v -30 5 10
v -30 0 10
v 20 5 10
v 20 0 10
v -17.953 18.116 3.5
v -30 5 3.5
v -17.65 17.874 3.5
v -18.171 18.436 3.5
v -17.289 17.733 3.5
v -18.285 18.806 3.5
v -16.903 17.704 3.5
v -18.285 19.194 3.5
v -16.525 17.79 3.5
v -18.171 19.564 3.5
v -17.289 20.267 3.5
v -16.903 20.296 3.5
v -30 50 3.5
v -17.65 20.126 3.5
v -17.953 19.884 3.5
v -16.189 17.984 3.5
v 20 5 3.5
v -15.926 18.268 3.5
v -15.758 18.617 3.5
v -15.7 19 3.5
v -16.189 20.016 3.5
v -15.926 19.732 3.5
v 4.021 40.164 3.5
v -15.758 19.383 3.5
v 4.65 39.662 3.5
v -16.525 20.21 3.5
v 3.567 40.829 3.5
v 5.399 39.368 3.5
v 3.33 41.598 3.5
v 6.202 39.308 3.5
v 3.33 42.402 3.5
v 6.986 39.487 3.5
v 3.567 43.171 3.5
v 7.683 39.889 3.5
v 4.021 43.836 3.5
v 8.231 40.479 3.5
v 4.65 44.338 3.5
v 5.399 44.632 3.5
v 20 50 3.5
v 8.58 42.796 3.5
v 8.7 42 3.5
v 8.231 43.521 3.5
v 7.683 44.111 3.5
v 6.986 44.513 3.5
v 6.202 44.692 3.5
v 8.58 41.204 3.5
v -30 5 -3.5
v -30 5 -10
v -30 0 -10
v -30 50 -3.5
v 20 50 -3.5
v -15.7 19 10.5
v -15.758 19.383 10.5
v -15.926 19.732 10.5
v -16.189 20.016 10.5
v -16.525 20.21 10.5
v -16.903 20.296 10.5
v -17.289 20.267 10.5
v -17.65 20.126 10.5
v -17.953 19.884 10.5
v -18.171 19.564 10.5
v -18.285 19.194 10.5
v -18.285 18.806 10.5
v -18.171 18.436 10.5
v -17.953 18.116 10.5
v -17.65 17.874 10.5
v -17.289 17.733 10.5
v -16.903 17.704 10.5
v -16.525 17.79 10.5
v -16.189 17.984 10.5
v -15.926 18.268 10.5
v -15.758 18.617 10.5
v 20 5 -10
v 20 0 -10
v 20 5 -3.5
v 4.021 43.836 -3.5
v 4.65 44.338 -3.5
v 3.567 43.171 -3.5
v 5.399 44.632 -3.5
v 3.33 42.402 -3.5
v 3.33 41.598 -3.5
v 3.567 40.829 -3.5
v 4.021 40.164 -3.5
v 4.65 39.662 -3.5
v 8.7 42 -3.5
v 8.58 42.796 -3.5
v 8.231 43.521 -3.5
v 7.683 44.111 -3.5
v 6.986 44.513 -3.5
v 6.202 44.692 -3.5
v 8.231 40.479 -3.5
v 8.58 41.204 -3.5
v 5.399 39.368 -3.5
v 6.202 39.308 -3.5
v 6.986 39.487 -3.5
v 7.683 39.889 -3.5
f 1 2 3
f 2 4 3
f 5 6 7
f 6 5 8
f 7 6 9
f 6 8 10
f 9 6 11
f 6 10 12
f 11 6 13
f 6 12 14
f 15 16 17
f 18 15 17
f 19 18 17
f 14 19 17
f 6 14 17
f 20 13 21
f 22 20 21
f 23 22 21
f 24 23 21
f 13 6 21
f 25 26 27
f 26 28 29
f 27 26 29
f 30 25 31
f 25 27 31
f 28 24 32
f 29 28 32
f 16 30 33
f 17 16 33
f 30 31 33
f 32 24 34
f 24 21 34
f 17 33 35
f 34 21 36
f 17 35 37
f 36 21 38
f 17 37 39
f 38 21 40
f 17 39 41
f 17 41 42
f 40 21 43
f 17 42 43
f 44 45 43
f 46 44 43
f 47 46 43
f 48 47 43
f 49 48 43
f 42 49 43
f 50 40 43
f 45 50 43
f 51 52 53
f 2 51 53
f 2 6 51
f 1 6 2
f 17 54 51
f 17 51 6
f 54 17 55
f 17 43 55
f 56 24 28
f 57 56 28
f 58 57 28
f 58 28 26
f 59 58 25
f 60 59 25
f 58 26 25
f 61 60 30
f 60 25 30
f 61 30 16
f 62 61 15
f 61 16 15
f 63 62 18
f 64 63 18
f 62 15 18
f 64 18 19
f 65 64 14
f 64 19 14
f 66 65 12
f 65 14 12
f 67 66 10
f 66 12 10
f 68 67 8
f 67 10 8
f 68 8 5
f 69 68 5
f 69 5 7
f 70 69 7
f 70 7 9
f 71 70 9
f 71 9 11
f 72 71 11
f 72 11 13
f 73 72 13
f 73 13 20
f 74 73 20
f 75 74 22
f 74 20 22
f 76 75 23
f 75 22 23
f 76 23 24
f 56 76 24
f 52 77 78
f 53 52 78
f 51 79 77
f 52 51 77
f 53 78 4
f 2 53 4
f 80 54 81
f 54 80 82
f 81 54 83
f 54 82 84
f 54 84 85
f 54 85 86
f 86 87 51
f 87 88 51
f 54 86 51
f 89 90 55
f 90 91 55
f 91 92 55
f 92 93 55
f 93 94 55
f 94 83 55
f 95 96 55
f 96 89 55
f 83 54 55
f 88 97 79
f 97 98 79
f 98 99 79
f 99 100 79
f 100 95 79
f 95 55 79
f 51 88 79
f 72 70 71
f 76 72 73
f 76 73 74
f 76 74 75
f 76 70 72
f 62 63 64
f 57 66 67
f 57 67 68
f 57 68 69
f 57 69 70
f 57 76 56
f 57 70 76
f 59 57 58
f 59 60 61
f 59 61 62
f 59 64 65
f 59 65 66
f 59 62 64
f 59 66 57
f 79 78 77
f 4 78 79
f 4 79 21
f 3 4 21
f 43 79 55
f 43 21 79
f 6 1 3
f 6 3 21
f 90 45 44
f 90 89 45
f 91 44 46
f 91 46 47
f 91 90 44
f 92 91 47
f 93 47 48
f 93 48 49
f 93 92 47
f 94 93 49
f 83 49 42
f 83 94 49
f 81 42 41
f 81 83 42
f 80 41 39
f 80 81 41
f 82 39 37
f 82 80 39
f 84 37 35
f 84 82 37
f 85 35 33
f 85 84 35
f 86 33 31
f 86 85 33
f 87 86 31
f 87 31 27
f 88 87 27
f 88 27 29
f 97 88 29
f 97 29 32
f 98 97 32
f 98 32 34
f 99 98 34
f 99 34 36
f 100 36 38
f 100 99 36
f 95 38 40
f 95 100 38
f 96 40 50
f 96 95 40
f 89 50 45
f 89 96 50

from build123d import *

# Parameters (mm, degrees)
SKETCH_1_W      = 40
SKETCH_1_H      = 50
SKETCH_1_R      = 2.7
EXTRUDE_1_DEPTH = 3.5
SKETCH_3_W      = 40
SKETCH_3_H      = 5
EXTRUDE_2_DEPTH = 10
EXTRUDE_3_DEPTH = 10
SKETCH_5_R      = 1.3
EXTRUDE_4_DEPTH = 7


with BuildPart() as part:
    # 草图1 → 凸台-拉伸1 (new, symmetric)
    with BuildSketch(Plane.XY):
        with Locations((0, 25)):
            Rectangle(SKETCH_1_W, SKETCH_1_H)
        with Locations((6, 42)):
            Circle(SKETCH_1_R, mode=Mode.SUBTRACT)
    extrude(amount=EXTRUDE_1_DEPTH, both=True)

    # 草图3 → 凸台-拉伸2 (add, symmetric)
    with BuildSketch(Plane.XY):
        with Locations((0, 2.5)):
            Rectangle(SKETCH_3_W, SKETCH_3_H)
    extrude(amount=EXTRUDE_2_DEPTH, both=True)

    # 草图7 → 凸台-拉伸3 (add)
    with BuildSketch(Plane.ZY.offset(20)):
        Polygon((-10, 0), (10, 0), (10, 5), (3.5, 5), (3.5, 50), (-3.5, 50), (-3.5, 5), (-10, 5), align=None)
    extrude(amount=EXTRUDE_3_DEPTH)

    # 草图5 → 凸台-拉伸4 (add)
    with BuildSketch(Plane.XY.offset(3.5)):
        with Locations((-17, 19)):
            Circle(SKETCH_5_R)
    extrude(amount=EXTRUDE_4_DEPTH)


solid = part.part
